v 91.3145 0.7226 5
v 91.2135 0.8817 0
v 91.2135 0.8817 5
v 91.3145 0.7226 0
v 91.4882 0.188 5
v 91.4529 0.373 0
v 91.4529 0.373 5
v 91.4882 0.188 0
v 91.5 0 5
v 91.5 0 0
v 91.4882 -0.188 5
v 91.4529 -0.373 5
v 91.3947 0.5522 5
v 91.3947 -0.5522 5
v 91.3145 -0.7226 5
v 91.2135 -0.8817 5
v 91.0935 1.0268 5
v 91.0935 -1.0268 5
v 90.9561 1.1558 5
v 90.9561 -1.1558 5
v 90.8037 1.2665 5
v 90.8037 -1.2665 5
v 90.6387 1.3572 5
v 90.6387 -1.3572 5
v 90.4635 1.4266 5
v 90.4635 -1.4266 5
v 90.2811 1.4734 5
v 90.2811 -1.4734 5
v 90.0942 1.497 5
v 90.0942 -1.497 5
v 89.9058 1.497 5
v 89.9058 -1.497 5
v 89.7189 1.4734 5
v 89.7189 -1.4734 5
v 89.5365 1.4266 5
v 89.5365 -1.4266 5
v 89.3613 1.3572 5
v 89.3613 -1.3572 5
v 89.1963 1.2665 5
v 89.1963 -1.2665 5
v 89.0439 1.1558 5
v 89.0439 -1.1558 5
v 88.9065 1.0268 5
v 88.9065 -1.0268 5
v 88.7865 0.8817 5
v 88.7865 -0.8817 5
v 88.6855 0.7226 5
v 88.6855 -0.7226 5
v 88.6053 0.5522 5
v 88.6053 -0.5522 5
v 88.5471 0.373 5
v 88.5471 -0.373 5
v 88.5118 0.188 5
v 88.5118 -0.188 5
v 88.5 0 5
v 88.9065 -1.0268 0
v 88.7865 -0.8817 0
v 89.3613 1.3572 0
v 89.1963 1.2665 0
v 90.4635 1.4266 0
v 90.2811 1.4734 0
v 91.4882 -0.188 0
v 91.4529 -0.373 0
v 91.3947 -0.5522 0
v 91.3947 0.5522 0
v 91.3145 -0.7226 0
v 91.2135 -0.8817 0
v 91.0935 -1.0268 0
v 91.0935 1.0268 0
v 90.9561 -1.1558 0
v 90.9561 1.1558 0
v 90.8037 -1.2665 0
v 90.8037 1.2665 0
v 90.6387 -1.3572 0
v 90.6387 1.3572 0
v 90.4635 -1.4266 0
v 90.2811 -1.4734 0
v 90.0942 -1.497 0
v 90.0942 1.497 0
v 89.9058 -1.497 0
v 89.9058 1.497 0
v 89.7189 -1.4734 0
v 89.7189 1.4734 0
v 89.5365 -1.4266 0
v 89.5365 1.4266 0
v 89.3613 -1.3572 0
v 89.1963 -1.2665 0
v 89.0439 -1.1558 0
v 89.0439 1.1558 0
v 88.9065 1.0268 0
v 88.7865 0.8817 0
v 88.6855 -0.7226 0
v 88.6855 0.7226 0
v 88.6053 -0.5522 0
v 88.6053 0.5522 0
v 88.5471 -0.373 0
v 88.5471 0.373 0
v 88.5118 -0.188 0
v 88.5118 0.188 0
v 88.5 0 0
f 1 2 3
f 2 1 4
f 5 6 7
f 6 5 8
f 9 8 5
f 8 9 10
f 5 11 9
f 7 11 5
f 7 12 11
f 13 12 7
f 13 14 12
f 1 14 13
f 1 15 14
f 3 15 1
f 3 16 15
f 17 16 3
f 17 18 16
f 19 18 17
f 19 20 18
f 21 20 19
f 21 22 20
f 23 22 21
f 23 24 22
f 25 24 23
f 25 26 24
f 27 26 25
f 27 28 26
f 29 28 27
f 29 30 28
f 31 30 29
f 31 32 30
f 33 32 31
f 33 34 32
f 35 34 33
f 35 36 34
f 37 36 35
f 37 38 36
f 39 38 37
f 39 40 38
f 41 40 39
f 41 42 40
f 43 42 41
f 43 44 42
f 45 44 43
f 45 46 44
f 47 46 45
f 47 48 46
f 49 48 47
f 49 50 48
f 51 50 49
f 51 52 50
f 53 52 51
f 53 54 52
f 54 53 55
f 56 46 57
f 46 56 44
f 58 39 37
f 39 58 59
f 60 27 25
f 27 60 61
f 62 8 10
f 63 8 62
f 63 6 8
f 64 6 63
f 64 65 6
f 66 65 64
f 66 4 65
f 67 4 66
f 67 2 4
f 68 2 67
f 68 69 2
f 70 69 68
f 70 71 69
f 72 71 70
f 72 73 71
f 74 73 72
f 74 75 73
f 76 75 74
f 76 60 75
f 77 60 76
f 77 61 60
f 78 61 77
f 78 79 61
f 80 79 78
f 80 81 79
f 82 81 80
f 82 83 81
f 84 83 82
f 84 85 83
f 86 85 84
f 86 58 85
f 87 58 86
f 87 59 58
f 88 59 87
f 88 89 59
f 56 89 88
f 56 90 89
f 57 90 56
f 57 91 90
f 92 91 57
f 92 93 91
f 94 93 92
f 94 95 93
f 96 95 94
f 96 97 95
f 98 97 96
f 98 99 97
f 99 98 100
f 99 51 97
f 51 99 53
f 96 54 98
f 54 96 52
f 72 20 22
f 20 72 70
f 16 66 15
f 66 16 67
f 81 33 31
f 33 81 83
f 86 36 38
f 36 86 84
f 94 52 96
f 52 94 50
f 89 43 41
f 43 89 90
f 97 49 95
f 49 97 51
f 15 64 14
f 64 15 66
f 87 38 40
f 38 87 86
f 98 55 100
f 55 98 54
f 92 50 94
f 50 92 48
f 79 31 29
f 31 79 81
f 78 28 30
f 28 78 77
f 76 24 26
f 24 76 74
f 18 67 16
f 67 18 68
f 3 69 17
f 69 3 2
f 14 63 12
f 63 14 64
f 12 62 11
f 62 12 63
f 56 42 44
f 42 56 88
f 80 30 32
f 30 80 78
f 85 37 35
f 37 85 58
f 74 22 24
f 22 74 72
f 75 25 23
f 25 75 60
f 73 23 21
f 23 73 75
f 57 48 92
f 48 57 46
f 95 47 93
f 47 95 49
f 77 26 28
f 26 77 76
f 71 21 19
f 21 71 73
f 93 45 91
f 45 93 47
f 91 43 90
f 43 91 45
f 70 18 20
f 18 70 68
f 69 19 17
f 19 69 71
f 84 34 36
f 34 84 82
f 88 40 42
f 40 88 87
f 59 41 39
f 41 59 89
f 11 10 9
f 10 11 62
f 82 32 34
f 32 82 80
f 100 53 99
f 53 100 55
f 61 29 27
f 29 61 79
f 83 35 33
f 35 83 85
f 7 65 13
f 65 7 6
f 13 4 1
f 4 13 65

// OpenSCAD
// SPDX-License-Identifier: MIT
// Alphabets New Spool
$fn=(50);

// Parameters
ncards=64; // number of cards
sdiam=85; // diameter of the spool mm
e=2; // 3d printed part thickness mm

// Variables
srad=sdiam/2;
angle=360/ncards; // angle of rotation

// define copy_mirror function
module copy_mirror(vec=[0,1,0])
{
    children();
    mirror(vec) children();
} 

// Define axis motor
module axismotor() {
intersection() {square(size = [3, 6], center = true); circle(2.5);}
}

// Define axis support
module axis() {
circle(1.5);
}

// define aro
module aro() {
difference(){
    difference() { circle(srad); circle(srad-5);}
    for (a=[0:angle:360]){
    rotate(a) 
    translate([srad-2.5,0,0]) circle(1.5);
    }
}
}

// CODE STARTS HERE

linear_extrude(height = e) {
union(){    
aro();
    difference() {
        intersection() {
            union() {
                translate ([srad,0,0]) aro();
                translate ([-srad,0,0])  aro();
                circle (6.5);
                }
            circle(srad-5);
        }

    axismotor();
    }
}    
}

translate ([sdiam+5,0,0])
        union() {
        linear_extrude(height = 5) {circle(1.5);}
        linear_extrude(height = e) {
        union(){    
        aro();
                intersection() {
                    union() {
                        translate ([srad,0,0]) aro();
                        translate ([-srad,0,0])  aro();
                        circle (6.5);
                        }
                    circle(srad-5);
                }

        }    
        }
    }
